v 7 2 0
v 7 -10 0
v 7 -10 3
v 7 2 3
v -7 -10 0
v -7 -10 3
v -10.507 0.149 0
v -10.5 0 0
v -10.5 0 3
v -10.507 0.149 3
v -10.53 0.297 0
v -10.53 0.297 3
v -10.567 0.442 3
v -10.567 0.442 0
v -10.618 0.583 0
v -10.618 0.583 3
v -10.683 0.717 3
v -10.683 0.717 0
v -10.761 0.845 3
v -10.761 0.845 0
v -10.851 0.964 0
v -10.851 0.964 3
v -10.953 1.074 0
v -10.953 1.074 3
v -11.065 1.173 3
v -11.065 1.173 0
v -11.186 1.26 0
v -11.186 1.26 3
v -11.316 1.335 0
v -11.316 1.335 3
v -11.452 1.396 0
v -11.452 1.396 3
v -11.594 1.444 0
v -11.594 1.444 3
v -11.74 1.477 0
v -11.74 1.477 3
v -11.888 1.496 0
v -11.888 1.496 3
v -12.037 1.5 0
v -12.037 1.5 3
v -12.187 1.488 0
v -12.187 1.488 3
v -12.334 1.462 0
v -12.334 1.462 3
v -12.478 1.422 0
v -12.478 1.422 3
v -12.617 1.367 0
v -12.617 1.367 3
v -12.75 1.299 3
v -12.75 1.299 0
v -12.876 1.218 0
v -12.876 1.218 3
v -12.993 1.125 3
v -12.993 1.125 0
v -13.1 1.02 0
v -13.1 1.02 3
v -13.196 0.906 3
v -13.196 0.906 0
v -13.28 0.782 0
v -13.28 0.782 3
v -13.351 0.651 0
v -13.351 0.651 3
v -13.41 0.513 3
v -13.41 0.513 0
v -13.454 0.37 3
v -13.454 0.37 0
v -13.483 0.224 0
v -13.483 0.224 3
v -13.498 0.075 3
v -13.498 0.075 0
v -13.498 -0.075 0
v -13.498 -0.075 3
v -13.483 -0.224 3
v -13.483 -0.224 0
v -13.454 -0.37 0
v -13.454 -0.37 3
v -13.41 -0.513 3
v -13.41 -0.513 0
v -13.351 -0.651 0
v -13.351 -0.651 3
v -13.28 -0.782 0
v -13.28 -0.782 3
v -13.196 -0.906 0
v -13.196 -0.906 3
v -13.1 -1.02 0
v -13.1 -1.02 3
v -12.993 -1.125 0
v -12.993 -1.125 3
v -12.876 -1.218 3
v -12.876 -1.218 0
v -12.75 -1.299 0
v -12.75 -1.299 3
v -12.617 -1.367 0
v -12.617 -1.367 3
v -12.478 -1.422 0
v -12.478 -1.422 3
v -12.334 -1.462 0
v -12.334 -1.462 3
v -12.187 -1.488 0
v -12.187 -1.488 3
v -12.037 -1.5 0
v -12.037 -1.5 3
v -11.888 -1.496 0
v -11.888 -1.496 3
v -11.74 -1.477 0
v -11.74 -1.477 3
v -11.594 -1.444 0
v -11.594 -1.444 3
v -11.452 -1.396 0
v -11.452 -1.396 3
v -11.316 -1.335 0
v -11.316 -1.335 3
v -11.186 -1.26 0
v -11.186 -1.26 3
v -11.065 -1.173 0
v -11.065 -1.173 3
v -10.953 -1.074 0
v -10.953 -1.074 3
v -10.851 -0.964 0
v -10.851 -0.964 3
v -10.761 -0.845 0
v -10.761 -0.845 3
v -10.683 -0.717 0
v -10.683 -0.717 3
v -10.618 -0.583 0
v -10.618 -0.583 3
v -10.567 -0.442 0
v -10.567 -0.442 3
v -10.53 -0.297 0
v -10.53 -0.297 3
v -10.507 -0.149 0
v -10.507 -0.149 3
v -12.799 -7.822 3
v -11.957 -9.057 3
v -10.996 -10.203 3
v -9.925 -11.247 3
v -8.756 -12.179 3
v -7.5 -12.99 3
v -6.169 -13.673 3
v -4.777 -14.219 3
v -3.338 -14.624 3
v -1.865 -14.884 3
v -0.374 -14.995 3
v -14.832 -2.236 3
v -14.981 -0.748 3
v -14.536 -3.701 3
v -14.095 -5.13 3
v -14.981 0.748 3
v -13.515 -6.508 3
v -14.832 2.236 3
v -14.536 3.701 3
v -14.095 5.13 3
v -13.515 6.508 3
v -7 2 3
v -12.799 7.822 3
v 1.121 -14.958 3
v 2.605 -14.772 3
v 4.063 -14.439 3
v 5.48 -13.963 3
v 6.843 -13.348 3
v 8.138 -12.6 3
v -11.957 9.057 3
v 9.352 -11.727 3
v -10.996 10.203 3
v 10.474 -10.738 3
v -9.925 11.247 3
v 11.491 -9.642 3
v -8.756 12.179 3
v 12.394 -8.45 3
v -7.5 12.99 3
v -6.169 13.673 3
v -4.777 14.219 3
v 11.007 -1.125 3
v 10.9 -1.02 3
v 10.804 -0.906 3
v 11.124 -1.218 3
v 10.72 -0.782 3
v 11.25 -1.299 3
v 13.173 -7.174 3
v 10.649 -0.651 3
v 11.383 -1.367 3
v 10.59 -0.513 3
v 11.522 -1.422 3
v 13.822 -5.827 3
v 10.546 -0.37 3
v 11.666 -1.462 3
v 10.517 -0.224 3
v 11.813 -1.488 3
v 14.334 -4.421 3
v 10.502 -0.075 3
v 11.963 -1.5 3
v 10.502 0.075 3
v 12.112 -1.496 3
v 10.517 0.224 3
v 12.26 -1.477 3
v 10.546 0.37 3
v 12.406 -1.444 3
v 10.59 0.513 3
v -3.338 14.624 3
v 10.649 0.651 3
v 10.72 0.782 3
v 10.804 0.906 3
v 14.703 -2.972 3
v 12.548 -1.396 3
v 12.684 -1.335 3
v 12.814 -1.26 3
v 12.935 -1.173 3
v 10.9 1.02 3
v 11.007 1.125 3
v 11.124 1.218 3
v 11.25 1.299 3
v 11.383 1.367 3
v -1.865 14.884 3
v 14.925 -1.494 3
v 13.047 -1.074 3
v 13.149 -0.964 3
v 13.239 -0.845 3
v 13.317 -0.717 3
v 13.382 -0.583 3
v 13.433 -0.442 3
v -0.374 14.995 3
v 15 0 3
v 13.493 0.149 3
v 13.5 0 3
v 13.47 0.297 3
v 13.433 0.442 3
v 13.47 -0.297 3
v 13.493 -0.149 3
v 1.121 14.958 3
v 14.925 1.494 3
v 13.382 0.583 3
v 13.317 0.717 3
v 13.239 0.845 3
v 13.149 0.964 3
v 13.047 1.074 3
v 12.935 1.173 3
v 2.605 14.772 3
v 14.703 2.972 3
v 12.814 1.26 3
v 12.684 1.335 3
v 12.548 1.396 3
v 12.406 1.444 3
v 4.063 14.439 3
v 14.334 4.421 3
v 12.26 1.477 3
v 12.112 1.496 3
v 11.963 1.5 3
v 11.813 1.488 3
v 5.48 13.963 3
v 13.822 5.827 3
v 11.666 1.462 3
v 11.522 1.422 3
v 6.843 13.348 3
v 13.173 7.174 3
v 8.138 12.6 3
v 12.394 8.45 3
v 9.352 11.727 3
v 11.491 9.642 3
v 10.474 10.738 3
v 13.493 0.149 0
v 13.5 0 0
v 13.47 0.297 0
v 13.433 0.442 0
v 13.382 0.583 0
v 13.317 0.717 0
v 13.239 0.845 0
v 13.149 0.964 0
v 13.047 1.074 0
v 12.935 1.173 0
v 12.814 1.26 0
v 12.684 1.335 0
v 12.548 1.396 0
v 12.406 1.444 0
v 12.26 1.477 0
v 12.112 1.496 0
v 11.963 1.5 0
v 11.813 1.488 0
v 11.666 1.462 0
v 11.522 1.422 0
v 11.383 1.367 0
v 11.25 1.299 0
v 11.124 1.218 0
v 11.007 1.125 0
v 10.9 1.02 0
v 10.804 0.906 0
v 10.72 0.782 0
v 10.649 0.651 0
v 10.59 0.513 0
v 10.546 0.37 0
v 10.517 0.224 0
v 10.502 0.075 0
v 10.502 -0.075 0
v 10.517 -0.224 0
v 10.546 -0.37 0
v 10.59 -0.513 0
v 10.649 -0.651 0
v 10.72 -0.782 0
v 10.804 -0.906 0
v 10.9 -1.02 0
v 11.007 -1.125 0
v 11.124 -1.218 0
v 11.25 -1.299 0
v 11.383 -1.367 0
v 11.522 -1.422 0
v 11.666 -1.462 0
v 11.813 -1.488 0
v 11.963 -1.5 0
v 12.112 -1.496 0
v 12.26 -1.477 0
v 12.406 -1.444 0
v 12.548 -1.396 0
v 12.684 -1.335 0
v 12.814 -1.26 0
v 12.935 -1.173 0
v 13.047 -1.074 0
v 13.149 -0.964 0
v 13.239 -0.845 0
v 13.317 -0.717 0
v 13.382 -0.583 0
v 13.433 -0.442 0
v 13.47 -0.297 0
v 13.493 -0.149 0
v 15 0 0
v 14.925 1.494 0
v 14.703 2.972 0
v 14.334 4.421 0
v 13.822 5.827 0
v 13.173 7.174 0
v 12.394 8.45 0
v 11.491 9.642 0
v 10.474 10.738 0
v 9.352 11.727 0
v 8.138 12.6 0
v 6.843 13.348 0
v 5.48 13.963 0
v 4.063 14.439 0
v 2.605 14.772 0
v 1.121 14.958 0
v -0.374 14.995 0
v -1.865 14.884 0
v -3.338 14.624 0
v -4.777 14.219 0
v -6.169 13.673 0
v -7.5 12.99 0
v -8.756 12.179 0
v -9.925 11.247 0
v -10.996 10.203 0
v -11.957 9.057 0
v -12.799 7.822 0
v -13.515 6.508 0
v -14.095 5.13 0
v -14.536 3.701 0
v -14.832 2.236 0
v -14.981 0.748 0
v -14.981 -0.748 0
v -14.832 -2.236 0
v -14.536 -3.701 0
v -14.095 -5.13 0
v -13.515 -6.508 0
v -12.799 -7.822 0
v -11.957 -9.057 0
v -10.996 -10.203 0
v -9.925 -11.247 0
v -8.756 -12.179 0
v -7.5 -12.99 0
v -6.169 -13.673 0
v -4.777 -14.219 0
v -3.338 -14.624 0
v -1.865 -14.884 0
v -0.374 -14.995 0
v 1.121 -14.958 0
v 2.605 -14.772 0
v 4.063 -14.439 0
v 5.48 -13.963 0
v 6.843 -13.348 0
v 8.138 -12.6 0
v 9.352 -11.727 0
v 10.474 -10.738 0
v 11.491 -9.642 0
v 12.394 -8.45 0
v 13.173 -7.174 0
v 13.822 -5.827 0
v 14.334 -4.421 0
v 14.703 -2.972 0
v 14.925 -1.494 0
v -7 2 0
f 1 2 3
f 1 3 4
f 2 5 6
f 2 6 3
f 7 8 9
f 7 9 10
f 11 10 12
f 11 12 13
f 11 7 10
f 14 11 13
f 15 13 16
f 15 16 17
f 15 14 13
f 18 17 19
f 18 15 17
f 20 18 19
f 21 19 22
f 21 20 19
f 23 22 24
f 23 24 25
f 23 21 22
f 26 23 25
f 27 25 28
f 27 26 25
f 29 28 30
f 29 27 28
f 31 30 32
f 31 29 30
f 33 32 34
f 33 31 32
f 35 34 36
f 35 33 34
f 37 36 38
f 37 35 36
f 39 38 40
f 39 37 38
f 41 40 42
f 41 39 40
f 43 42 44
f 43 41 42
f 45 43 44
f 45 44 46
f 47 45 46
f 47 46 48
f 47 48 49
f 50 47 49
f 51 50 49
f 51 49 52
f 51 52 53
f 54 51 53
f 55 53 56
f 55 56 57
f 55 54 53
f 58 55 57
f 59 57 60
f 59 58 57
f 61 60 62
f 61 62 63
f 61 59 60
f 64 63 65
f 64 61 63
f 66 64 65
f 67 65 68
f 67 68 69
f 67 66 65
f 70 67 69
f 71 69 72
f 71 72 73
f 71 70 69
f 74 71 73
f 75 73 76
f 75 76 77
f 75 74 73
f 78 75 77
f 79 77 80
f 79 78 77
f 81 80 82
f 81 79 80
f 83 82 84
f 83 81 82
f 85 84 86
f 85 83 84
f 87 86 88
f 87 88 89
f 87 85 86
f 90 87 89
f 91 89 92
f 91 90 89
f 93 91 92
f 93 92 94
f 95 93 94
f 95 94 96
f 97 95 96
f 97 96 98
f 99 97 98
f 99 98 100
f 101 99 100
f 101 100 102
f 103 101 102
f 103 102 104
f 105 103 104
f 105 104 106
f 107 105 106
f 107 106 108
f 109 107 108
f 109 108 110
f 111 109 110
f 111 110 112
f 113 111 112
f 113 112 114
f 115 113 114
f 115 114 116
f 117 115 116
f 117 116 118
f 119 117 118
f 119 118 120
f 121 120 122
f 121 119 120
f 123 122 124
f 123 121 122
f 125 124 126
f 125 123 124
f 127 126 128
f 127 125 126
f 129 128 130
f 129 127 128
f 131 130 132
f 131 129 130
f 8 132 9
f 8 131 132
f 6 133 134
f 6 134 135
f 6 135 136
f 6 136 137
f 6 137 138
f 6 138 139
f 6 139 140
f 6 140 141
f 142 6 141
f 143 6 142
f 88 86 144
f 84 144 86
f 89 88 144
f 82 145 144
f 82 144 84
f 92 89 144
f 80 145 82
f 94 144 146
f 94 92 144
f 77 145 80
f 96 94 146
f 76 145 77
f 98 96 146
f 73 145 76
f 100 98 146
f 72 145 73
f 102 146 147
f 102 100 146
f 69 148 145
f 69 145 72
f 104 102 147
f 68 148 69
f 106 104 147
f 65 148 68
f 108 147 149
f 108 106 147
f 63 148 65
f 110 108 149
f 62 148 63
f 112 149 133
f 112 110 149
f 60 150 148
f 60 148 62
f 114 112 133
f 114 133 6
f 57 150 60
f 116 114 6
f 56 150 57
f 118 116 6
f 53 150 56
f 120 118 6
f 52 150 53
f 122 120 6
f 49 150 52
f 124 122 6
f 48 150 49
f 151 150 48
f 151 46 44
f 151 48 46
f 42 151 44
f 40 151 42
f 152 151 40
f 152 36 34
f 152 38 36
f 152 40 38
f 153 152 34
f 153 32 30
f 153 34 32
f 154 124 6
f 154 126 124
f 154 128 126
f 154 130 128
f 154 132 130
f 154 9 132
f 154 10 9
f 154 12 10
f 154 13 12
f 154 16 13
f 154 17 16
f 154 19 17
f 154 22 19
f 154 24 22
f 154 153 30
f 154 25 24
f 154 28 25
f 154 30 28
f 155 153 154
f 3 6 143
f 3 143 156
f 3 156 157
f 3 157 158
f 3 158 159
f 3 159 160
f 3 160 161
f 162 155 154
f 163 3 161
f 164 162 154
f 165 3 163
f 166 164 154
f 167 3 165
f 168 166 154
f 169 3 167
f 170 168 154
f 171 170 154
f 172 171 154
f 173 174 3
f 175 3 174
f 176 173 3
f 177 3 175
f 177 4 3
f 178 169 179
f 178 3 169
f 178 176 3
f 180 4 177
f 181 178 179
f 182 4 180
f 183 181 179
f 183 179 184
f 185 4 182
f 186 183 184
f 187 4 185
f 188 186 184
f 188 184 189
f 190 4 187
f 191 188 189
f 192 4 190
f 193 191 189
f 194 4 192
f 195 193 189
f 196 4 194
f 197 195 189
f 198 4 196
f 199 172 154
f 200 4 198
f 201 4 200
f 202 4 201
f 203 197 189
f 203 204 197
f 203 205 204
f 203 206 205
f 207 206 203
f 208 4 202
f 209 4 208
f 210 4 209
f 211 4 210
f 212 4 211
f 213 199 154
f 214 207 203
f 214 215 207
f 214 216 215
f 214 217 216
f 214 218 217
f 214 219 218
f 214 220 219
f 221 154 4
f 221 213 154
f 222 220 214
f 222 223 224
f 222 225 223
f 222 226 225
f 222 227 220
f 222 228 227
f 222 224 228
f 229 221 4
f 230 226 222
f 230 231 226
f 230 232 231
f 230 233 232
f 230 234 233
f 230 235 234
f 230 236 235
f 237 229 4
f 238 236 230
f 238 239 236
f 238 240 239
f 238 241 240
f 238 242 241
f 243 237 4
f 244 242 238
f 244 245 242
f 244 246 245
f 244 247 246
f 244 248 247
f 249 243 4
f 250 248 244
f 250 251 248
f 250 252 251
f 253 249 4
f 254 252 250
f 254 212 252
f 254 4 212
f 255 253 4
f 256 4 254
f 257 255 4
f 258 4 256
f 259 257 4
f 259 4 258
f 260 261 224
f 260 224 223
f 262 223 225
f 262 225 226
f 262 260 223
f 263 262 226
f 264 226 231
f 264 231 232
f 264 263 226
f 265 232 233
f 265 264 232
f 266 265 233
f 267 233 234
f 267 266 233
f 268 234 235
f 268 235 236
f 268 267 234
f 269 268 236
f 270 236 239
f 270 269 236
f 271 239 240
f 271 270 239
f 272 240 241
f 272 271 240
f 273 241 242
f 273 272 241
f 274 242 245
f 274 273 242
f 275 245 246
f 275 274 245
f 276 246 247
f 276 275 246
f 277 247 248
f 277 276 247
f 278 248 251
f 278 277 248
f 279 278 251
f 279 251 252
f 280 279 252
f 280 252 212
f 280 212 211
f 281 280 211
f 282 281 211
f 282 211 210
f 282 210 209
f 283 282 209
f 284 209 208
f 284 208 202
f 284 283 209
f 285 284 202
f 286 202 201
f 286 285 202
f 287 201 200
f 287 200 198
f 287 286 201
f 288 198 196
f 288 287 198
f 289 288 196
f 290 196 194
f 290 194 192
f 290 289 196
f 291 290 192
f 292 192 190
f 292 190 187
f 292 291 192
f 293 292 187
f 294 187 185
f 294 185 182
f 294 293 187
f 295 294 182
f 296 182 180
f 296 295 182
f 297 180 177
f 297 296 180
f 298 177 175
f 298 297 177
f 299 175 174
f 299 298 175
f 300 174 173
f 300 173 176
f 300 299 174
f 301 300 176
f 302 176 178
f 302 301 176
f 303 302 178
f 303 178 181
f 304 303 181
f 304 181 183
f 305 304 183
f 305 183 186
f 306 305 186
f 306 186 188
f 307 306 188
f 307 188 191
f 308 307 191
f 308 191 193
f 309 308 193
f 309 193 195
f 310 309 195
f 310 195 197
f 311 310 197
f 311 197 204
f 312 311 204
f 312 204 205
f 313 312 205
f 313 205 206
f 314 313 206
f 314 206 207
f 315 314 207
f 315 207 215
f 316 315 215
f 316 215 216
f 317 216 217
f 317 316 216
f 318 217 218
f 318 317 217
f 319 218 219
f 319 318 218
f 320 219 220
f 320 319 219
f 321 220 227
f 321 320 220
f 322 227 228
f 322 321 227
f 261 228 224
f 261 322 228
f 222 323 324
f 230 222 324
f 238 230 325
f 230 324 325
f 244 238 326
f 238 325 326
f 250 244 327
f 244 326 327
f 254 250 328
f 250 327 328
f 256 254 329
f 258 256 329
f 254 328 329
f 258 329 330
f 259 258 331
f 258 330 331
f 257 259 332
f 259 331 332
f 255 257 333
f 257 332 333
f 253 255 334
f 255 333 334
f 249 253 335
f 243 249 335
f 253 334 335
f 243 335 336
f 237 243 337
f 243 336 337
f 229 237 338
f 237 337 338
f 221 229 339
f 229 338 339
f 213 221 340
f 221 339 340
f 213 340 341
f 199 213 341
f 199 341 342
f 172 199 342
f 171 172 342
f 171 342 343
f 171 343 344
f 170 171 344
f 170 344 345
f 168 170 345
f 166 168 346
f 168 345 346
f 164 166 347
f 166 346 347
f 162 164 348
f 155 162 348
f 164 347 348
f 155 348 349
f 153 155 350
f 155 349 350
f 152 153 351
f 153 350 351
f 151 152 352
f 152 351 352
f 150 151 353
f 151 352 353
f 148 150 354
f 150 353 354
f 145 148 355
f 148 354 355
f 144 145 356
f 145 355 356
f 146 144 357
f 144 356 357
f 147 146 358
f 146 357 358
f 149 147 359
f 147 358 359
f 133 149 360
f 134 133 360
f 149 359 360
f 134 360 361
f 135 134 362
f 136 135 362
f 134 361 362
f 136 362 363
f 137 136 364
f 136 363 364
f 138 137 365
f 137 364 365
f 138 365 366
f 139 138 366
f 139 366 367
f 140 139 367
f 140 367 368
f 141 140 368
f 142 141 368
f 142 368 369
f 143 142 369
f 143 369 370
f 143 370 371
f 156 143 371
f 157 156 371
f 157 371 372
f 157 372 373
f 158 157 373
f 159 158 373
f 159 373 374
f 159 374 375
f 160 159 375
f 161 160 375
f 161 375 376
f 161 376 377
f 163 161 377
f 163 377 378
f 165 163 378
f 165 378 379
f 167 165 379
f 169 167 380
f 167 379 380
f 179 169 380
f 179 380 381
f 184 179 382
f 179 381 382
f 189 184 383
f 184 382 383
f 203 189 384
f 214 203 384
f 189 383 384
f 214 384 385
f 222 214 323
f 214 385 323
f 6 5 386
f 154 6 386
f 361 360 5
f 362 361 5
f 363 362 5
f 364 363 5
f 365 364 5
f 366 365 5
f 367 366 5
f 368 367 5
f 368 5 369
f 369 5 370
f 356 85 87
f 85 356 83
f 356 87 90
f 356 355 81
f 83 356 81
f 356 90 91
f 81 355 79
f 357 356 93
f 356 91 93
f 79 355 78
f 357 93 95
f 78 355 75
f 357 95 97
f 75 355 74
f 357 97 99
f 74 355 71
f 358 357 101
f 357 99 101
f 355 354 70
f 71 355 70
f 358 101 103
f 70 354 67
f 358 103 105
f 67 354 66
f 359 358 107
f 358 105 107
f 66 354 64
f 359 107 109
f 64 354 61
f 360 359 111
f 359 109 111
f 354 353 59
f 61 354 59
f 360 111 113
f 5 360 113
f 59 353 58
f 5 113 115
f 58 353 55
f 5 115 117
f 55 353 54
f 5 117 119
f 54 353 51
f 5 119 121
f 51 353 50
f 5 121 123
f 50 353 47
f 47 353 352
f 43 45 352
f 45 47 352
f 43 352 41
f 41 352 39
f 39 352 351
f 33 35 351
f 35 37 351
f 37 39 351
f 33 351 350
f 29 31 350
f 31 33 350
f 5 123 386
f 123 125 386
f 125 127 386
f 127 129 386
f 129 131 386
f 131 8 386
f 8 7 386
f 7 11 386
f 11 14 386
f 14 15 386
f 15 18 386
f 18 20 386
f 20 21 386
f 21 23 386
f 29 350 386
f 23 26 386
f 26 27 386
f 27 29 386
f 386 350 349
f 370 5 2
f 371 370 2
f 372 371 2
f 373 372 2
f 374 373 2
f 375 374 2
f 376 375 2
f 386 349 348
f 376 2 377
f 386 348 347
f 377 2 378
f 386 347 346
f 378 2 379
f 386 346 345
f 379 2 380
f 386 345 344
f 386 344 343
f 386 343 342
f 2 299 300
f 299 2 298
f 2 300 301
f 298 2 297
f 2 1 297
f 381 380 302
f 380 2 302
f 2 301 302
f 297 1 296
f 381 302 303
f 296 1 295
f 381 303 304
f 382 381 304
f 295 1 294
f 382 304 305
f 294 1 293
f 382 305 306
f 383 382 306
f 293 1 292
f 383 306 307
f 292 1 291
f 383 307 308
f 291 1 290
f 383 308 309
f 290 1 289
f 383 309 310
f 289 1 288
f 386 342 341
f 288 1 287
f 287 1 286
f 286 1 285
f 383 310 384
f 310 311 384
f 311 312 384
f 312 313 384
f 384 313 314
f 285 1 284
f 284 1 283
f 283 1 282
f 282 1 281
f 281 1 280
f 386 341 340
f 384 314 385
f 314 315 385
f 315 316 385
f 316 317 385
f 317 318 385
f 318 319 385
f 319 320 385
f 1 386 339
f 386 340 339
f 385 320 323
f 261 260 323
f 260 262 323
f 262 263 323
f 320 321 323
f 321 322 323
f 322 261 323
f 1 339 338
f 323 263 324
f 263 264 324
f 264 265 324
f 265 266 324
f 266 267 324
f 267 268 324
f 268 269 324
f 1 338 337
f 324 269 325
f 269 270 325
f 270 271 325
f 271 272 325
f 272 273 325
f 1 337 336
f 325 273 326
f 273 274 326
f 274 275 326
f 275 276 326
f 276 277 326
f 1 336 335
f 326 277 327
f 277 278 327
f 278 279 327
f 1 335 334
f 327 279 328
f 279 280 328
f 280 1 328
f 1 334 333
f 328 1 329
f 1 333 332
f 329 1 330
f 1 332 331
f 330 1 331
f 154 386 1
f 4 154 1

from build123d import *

# Parameters (mm, degrees)
SKETCH1_R           = 15
SKETCH1_R_2         = 1.5
SKETCH1_W           = 14
SKETCH1_H           = 12
BOSS_EXTRUDE1_DEPTH = 3


with BuildPart() as part:
    # Sketch1 → Boss-Extrude1 (new body)
    with BuildSketch(Plane.XY):
        Circle(SKETCH1_R)
        with Locations((-12, 0)):
            Circle(SKETCH1_R_2, mode=Mode.SUBTRACT)
        with Locations((12, 0)):
            Circle(SKETCH1_R_2, mode=Mode.SUBTRACT)
        with Locations((0, -4)):
            Rectangle(SKETCH1_W, SKETCH1_H, mode=Mode.SUBTRACT)
    extrude(amount=BOSS_EXTRUDE1_DEPTH)


solid = part.part
